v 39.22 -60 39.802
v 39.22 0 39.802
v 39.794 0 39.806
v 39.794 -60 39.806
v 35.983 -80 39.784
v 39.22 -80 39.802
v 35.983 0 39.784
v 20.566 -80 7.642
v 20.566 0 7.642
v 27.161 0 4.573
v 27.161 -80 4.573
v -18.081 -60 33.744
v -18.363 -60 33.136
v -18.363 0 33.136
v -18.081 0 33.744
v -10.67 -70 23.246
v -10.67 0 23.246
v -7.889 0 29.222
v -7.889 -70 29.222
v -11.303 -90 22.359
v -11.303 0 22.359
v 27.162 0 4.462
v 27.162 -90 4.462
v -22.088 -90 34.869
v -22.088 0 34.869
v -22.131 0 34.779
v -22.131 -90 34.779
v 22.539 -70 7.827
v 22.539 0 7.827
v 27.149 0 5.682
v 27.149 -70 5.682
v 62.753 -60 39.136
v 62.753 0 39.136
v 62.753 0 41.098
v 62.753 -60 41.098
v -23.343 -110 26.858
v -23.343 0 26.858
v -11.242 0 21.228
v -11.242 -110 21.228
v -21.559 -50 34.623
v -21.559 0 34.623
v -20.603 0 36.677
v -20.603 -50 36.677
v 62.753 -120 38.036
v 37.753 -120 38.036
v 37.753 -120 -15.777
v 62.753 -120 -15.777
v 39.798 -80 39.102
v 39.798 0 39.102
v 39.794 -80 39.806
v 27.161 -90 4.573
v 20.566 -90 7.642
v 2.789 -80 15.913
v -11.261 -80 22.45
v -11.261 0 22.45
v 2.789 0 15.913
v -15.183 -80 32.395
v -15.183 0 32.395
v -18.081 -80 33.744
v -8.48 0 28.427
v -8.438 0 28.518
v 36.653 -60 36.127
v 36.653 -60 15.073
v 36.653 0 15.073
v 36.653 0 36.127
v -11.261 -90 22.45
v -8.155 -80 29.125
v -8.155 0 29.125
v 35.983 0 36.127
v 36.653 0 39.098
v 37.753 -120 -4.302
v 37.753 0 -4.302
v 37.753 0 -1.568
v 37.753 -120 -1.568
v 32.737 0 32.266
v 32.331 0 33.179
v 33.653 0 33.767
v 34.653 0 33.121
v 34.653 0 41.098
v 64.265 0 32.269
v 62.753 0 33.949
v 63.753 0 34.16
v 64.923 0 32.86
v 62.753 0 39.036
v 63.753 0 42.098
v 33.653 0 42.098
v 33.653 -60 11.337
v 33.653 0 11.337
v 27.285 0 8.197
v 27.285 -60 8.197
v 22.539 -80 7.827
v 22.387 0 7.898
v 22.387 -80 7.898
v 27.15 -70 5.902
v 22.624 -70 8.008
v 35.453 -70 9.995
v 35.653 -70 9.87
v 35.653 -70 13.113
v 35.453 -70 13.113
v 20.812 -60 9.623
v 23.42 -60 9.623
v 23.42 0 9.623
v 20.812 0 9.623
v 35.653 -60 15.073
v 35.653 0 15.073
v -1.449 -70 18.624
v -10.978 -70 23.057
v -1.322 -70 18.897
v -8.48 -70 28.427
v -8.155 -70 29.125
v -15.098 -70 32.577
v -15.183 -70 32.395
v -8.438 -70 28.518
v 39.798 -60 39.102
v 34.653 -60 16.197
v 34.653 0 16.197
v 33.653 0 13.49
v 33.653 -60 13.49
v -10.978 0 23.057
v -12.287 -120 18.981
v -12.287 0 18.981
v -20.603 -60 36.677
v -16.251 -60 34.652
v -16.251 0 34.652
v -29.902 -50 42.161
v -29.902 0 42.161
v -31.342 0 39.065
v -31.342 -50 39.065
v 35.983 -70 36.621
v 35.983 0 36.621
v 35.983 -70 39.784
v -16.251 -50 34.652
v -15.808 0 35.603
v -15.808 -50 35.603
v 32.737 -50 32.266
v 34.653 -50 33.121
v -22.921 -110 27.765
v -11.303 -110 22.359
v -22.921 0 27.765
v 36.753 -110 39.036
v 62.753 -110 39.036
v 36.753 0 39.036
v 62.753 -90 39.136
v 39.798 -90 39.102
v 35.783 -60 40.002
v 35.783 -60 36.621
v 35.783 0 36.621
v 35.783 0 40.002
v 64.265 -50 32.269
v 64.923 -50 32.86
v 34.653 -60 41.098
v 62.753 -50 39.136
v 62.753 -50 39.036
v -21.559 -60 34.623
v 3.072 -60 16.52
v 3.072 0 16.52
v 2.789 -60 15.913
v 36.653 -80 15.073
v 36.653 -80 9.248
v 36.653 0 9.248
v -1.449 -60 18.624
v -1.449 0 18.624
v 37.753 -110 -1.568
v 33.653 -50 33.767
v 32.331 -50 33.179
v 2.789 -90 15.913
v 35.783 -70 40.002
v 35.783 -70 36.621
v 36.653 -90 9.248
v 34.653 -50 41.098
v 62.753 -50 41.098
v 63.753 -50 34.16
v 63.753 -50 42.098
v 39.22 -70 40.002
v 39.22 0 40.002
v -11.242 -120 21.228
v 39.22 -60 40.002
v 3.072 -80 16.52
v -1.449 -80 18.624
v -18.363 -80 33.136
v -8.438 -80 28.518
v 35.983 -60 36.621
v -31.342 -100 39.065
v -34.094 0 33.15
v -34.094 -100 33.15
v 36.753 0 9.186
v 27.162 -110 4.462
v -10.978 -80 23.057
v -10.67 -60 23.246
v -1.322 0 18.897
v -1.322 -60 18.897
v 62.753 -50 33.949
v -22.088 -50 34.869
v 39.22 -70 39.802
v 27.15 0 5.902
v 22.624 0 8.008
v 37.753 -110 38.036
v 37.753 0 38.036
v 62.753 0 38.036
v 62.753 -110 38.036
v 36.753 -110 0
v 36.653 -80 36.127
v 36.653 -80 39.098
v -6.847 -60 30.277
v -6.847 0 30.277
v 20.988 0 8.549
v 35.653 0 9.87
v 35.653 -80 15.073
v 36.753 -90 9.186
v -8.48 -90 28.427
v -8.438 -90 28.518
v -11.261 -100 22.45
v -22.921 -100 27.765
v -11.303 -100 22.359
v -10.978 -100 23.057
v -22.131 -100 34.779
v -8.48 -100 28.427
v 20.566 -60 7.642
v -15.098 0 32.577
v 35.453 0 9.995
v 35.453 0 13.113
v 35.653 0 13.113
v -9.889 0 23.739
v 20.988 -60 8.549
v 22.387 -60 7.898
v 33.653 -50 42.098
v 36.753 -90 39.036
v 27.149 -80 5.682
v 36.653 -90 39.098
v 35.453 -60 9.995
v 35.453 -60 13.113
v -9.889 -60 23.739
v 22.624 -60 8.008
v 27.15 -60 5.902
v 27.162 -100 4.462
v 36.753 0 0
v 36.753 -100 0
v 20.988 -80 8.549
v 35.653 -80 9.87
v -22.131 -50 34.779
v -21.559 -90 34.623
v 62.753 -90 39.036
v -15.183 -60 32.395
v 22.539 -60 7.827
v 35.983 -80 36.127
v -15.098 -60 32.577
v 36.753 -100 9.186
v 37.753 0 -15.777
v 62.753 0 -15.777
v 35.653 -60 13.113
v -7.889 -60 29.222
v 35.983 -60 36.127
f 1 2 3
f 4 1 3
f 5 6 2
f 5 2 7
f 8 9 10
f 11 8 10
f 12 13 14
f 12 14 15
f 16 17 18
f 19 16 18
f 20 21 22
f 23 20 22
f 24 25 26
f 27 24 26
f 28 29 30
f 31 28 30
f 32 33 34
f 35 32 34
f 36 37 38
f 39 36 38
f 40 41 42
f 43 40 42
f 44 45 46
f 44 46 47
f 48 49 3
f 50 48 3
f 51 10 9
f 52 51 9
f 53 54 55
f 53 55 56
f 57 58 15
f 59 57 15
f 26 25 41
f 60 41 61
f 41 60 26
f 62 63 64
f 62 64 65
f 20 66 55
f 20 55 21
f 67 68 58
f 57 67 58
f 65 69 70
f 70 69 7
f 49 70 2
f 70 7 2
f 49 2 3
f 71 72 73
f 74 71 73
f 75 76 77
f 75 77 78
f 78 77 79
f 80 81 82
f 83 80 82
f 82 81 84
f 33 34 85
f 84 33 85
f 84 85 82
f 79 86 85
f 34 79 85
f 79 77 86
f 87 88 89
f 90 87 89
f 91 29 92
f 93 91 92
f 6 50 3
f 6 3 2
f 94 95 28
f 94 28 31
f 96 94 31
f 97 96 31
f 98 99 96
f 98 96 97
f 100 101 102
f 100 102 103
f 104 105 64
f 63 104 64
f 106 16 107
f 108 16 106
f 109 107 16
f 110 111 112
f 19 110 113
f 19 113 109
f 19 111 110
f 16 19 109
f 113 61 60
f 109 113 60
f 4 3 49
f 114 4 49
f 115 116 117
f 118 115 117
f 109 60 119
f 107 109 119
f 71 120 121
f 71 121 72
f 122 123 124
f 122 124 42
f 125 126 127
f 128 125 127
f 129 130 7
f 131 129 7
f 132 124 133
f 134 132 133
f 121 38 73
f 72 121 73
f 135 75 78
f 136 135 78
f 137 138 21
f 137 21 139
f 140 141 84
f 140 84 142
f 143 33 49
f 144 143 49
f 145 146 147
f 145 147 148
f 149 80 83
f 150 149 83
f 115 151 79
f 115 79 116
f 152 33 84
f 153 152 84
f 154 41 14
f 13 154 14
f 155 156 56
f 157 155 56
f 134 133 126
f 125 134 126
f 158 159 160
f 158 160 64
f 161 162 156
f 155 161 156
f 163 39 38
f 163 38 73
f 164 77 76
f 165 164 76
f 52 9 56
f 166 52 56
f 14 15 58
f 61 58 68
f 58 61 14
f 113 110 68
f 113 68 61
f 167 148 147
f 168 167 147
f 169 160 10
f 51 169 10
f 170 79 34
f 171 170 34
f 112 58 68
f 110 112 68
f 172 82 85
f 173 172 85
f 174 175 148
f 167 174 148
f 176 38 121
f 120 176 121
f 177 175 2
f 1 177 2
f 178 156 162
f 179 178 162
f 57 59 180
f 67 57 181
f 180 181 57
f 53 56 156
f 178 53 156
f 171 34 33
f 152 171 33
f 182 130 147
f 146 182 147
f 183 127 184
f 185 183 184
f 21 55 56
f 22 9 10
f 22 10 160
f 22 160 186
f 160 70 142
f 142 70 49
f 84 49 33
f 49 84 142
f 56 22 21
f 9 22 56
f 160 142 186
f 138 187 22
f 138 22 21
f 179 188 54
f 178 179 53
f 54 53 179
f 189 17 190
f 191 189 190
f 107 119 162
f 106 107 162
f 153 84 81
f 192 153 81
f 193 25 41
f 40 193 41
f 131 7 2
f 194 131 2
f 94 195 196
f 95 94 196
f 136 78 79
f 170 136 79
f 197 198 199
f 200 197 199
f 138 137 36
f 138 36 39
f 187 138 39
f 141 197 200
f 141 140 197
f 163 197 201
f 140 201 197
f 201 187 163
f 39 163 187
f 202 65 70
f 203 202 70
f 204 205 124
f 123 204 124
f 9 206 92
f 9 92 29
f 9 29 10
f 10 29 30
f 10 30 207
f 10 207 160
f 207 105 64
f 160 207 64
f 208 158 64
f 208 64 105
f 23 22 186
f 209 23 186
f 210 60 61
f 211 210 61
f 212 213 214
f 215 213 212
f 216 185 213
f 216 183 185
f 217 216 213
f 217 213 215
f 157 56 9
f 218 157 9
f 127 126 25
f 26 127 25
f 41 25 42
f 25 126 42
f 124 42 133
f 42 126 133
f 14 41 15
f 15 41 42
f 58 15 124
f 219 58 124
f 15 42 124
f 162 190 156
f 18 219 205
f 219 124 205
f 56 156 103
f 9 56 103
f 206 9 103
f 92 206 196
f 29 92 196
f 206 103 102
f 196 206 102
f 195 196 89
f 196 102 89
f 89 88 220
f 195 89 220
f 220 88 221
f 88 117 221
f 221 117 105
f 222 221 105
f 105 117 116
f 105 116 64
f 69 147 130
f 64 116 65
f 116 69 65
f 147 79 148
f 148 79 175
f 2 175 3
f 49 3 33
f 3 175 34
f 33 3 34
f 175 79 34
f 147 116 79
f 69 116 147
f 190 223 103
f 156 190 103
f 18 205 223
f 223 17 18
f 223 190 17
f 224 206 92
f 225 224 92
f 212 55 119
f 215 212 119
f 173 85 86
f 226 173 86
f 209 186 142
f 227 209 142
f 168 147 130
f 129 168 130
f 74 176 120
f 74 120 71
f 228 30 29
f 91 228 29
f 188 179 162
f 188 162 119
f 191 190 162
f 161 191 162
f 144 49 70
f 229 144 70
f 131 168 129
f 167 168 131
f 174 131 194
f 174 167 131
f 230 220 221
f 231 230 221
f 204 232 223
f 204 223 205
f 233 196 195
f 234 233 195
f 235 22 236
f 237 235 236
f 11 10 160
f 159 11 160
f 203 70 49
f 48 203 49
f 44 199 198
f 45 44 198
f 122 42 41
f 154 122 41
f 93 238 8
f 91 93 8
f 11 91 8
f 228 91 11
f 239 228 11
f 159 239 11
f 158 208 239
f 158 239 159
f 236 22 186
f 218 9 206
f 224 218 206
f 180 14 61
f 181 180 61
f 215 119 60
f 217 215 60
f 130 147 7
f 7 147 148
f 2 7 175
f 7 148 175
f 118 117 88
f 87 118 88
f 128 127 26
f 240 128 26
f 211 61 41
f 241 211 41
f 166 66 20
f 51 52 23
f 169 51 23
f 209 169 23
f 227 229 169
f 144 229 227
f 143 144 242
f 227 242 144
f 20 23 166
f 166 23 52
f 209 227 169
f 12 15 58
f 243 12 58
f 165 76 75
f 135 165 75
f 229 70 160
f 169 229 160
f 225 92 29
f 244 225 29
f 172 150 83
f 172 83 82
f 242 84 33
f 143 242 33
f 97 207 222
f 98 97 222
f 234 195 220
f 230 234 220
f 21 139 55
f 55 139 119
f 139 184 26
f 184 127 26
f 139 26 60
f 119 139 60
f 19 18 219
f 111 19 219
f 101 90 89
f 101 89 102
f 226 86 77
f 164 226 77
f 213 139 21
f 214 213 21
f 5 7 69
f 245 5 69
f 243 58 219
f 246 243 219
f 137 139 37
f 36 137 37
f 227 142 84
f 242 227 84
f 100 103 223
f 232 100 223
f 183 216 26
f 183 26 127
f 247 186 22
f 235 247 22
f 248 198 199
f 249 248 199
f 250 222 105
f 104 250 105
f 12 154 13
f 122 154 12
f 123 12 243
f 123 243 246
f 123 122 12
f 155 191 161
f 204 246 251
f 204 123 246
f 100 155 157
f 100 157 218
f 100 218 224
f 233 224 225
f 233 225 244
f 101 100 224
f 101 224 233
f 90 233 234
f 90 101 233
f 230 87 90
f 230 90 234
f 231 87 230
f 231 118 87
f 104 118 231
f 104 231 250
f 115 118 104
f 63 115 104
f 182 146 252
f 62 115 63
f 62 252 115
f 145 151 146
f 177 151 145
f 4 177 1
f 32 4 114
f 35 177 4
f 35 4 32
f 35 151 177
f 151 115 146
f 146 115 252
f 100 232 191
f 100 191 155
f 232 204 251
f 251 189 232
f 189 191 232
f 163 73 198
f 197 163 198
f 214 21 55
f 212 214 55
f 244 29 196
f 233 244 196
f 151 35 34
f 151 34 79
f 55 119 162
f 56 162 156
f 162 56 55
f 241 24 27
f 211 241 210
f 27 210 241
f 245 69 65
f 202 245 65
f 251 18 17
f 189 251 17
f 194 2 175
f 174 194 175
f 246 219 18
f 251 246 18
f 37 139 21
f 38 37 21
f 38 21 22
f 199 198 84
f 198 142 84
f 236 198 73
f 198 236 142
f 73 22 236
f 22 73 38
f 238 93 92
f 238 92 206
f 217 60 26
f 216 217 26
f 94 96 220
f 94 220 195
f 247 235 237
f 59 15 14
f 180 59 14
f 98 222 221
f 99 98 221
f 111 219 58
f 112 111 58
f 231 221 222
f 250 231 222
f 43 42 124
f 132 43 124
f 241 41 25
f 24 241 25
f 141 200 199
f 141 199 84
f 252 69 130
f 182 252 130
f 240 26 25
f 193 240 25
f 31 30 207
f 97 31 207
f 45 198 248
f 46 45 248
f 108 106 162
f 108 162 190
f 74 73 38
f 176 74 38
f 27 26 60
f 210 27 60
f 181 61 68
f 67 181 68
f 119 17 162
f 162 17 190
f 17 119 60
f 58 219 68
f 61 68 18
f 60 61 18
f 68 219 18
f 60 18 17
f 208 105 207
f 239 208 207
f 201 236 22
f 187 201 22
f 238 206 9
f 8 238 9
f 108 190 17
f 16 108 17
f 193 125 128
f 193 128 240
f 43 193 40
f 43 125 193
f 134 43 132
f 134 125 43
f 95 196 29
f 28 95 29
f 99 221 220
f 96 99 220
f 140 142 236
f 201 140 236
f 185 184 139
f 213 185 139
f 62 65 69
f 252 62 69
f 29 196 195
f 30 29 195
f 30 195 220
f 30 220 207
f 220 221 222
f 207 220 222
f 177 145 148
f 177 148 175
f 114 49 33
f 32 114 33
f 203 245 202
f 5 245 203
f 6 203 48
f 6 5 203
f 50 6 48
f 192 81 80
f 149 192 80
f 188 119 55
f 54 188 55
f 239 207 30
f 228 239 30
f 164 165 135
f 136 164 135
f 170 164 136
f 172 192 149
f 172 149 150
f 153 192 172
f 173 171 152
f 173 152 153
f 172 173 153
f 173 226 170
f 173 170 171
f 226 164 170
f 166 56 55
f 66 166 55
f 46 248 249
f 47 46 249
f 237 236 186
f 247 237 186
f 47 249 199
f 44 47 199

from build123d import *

# Parameters (mm, degrees)
F1_DEPTH  = 120
F2_DEPTH  = 120
F3_DEPTH  = 110
F4_DEPTH  = 100
F5_DEPTH  = 100
F6_DEPTH  = 90
F7_DEPTH  = 90
F8_DEPTH  = 80
F9_DEPTH  = 80
F10_DEPTH = 80
F11_DEPTH = 80
F12_DEPTH = 70
F13_DEPTH = 70
F14_DEPTH = 70
F15_DEPTH = 60
F16_DEPTH = 50
F17_DEPTH = 50


with BuildPart() as f1:
    # F0 (on Front) → F1 (new body)
    with BuildSketch(Plane.XZ):
        Polygon((62.7532724798, 38.0357114375), (37.7532724798, 38.0357114375), (37.7532724798, -1.5682141957), (37.7532724798, -4.3017355892), (37.7532724798, -15.7766969041), (62.7532724798, -15.7766969041), (62.7532724798, 33.9487026308), align=None)
    extrude(amount=F1_DEPTH)


with BuildPart() as f2:
    # F0 (on Front) → F2 (new body)
    with BuildSketch(Plane.XZ):
        Polygon((37.7532724798, -4.3017355892), (37.7532724798, -1.5682141957), (-11.2419818741, 21.2279597301), (-12.2874860827, 18.9808833218), align=None)
    extrude(amount=F2_DEPTH)


with BuildPart() as f3:
    # F0 (on Front) → F3 (new body)
    with BuildSketch(Plane.XZ):
        Polygon((37.7532724798, -1.5682141957), (37.7532724798, 38.0357114375), (62.7532724798, 38.0357114375), (62.7532724798, 39.0357114375), (36.7532724798, 39.0357114375), (36.7532724798, 9.1857140462), (36.7532724798, 0), (27.1622682206, 4.462436293), (-11.3030609789, 22.3593192893), (-22.9213011947, 27.7649739423), (-23.3431488375, 26.8583072085), (-11.2419818741, 21.2279597301), align=None)
    extrude(amount=F3_DEPTH)


with BuildPart() as f4:
    # F0 (on Front) → F4 (new body)
    with BuildSketch(Plane.XZ):
        Polygon((-34.093962769, 33.1498159787), (-22.9213011947, 27.7649739423), (-11.3030609789, 22.3593192893), (-11.2608762147, 22.4499859627), (-10.978238294, 23.0574526744), (-8.4797753205, 28.427337519), (-22.130522729, 34.7786630963), (-31.3420099408, 39.0645203158), align=None)
    extrude(amount=F4_DEPTH)


with BuildPart() as f5:
    # F0 (on Front) → F5 (new body)
    with BuildSketch(Plane.XZ):
        Polygon((36.7532724798, 0), (36.7532724798, 9.1857140462), (27.1622682206, 4.462436293), align=None)
    extrude(amount=F5_DEPTH)


with BuildPart() as f6:
    # F0 (on Front) → F6 (new body)
    with BuildSketch(Plane.XZ):
        Polygon((-22.0883379648, 34.8693297696), (-22.130522729, 34.7786630963), (-8.4797753205, 28.427337519), (-8.4375905562, 28.5180041924), (-18.3633532114, 33.1361945624), (-21.5590084305, 34.6230469758), align=None)
    extrude(amount=F6_DEPTH)


with BuildPart() as f7:
    # F0 (on Front) → F7 (new body)
    with BuildSketch(Plane.XZ):
        Polygon((36.7532724798, 39.0357114375), (62.7532724798, 39.0357114375), (62.7528878644, 39.1357106978), (39.7976157027, 39.102147702), (36.6532724798, 39.0975503451), (36.6532724798, 36.1267757076), (36.6532724798, 15.0731514328), (36.6532724798, 9.2479357519), (27.1610418439, 4.5733010026), (20.5657351541, 7.641919798), (2.7888639591, 15.9130197843), (-11.2608762147, 22.4499859627), (-11.3030609789, 22.3593192893), (27.1622682206, 4.462436293), (36.7532724798, 9.1857140462), align=None)
    extrude(amount=F7_DEPTH)


with BuildPart() as f8:
    # F0 (on Front) → F8 (new body)
    with BuildSketch(Plane.XZ):
        Polygon((-18.3633532114, 33.1361945624), (-8.4375905562, 28.5180041924), (-8.1549526356, 29.1254709041), (-15.182753971, 32.3953178244), (-18.0807152907, 33.743661274), align=None)
    extrude(amount=F8_DEPTH)


with BuildPart() as f9:
    # F0 (on Front) → F9 (new body)
    with BuildSketch(Plane.XZ):
        Polygon((-10.978238294, 23.0574526744), (-11.2608762147, 22.4499859627), (2.7888639591, 15.9130197843), (3.0715018798, 16.520486496), (-1.4491225172, 18.6238114275), align=None)
    extrude(amount=F9_DEPTH)


with BuildPart() as f10:
    # F0 (on Front) → F10 (new body)
    with BuildSketch(Plane.XZ):
        Polygon((36.6532724798, 9.2479357519), (36.6532724798, 15.0731514328), (35.6532724798, 15.0731514328), (35.6532724798, 13.1126534771), (35.6532724798, 9.8701528088), (27.1487780767, 5.6819480983), (22.5392122094, 7.8266551035), (22.3868255866, 7.8975565001), (20.9875827969, 8.5485865318), (20.5657351541, 7.641919798), (27.1610418439, 4.5733010026), align=None)
    extrude(amount=F10_DEPTH)


with BuildPart() as f11:
    # F0 (on Front) → F11 (new body)
    with BuildSketch(Plane.XZ):
        Polygon((36.6532724798, 39.0975503451), (39.7976157027, 39.102147702), (39.793651551, 39.8057106978), (39.2196251732, 39.8024764065), (35.9832724798, 39.7842415175), (35.9832724798, 36.6213790533), (35.9832724798, 36.1267757076), (36.6532724798, 36.1267757076), align=None)
    extrude(amount=F11_DEPTH)


with BuildPart() as f12:
    # F0 (on Front) → F12 (new body)
    with BuildSketch(Plane.XZ):
        Polygon((-8.4797753205, 28.427337519), (-10.978238294, 23.0574526744), (-1.4491225172, 18.6238114275), (-1.3221520646, 18.8967058894), (-10.6699344947, 23.2459776078), (-7.8892497602, 29.2224347223), (-15.0983844425, 32.5766511712), (-15.182753971, 32.3953178244), (-8.1549526356, 29.1254709041), (-8.4375905562, 28.5180041924), align=None)
    extrude(amount=F12_DEPTH)


with BuildPart() as f13:
    # F0 (on Front) → F13 (new body)
    with BuildSketch(Plane.XZ):
        Polygon((35.6532724798, 9.8701528088), (35.6532724798, 13.1126534771), (35.4532724798, 13.1126534771), (35.4532724798, 9.9945962201), (27.1500502265, 5.9019444202), (22.623581738, 8.0079884503), (22.5392122094, 7.8266551035), (27.1487780767, 5.6819480983), align=None)
    extrude(amount=F13_DEPTH)


with BuildPart() as f14:
    # F0 (on Front) → F14 (new body)
    with BuildSketch(Plane.XZ):
        Polygon((35.9832724798, 39.7842415175), (39.2196251732, 39.8024764065), (39.2196251732, 40.0024764065), (35.7832724798, 40.0024764065), (35.7832724798, 36.6213790533), (35.9832724798, 36.6213790533), align=None)
    extrude(amount=F14_DEPTH)


with BuildPart() as f15:
    # F0 (on Front) → F15 (new body)
    with BuildSketch(Plane.XZ):
        Polygon((39.7976157027, 39.102147702), (62.7528878644, 39.1357106978), (62.7532724798, 41.0975503451), (47.1063793285, 41.0975503451), (46.2950781567, 41.0975503451), (34.6532724798, 41.0975503451), (34.6532724798, 33.1212431192), (34.6532724798, 16.1968208849), (33.6532724798, 13.4902799919), (33.6532724798, 11.3371306487), (27.2846735988, 8.1965293971), (23.4195049673, 9.6229607518), (20.8119284672, 9.6229607518), (-9.8889558036, 23.7389743125), (-6.8471991162, 30.2765469362), (-16.2509841568, 34.6518751628), (-20.6033906013, 36.6769328059), (-21.5590084305, 34.6230469758), (-18.3633532114, 33.1361945624), (-18.0807152907, 33.743661274), (-15.182753971, 32.3953178244), (-15.0983844425, 32.5766511712), (-7.8892497602, 29.2224347223), (-10.6699344947, 23.2459776078), (-1.3221520646, 18.8967058894), (-1.4491225172, 18.6238114275), (3.0715018798, 16.520486496), (2.7888639591, 15.9130197843), (20.5657351541, 7.641919798), (20.9875827969, 8.5485865318), (22.3868255866, 7.8975565001), (22.5392122094, 7.8266551035), (22.623581738, 8.0079884503), (27.1500502265, 5.9019444202), (35.4532724798, 9.9945962201), (35.4532724798, 13.1126534771), (35.6532724798, 13.1126534771), (35.6532724798, 15.0731514328), (36.6532724798, 15.0731514328), (36.6532724798, 36.1267757076), (35.9832724798, 36.1267757076), (35.9832724798, 36.6213790533), (35.7832724798, 36.6213790533), (35.7832724798, 40.0024764065), (39.2196251732, 40.0024764065), (39.2196251732, 39.8024764065), (39.793651551, 39.8057106978), align=None)
    extrude(amount=F15_DEPTH)


with BuildPart() as f16:
    # F0 (on Front) → F16 (new body)
    with BuildSketch(Plane.XZ):
        Polygon((-29.9015114106, 42.1605482769), (-31.3420099408, 39.0645203158), (-22.130522729, 34.7786630963), (-22.0883379648, 34.8693297696), (-21.5590084305, 34.6230469758), (-20.6033906013, 36.6769328059), (-16.2509841568, 34.6518751628), (-15.8082882201, 35.6033506205), align=None)
    extrude(amount=F16_DEPTH)


with BuildPart() as f17:
    # F0 (on Front) → F17 (new body)
    with BuildSketch(Plane.XZ):
        Polygon((62.7532724798, 39.0357114375), (62.7532724798, 38.0357114375), (62.7532724798, 33.9487026308), (64.2652862209, 32.2687230941), (64.9227538708, 32.8604565643), (63.7534983963, 34.1596016824), (63.7534983963, 42.0975503451), (33.6532724798, 42.0975503451), (33.6532724798, 33.7673542435), (32.3305874402, 33.1794772946), (32.7367356742, 32.2656700874), (34.6532724798, 33.1212431192), (34.6532724798, 41.0975503451), (46.2950781567, 41.0975503451), (47.1063793285, 41.0975503451), (62.7532724798, 41.0975503451), (62.7528878644, 39.1357106978), align=None)
    extrude(amount=F17_DEPTH)


solid = Compound([f1.part, f2.part, f3.part, f4.part, f5.part, f6.part, f7.part, f8.part, f9.part, f10.part, f11.part, f12.part, f13.part, f14.part, f15.part, f16.part, f17.part])
